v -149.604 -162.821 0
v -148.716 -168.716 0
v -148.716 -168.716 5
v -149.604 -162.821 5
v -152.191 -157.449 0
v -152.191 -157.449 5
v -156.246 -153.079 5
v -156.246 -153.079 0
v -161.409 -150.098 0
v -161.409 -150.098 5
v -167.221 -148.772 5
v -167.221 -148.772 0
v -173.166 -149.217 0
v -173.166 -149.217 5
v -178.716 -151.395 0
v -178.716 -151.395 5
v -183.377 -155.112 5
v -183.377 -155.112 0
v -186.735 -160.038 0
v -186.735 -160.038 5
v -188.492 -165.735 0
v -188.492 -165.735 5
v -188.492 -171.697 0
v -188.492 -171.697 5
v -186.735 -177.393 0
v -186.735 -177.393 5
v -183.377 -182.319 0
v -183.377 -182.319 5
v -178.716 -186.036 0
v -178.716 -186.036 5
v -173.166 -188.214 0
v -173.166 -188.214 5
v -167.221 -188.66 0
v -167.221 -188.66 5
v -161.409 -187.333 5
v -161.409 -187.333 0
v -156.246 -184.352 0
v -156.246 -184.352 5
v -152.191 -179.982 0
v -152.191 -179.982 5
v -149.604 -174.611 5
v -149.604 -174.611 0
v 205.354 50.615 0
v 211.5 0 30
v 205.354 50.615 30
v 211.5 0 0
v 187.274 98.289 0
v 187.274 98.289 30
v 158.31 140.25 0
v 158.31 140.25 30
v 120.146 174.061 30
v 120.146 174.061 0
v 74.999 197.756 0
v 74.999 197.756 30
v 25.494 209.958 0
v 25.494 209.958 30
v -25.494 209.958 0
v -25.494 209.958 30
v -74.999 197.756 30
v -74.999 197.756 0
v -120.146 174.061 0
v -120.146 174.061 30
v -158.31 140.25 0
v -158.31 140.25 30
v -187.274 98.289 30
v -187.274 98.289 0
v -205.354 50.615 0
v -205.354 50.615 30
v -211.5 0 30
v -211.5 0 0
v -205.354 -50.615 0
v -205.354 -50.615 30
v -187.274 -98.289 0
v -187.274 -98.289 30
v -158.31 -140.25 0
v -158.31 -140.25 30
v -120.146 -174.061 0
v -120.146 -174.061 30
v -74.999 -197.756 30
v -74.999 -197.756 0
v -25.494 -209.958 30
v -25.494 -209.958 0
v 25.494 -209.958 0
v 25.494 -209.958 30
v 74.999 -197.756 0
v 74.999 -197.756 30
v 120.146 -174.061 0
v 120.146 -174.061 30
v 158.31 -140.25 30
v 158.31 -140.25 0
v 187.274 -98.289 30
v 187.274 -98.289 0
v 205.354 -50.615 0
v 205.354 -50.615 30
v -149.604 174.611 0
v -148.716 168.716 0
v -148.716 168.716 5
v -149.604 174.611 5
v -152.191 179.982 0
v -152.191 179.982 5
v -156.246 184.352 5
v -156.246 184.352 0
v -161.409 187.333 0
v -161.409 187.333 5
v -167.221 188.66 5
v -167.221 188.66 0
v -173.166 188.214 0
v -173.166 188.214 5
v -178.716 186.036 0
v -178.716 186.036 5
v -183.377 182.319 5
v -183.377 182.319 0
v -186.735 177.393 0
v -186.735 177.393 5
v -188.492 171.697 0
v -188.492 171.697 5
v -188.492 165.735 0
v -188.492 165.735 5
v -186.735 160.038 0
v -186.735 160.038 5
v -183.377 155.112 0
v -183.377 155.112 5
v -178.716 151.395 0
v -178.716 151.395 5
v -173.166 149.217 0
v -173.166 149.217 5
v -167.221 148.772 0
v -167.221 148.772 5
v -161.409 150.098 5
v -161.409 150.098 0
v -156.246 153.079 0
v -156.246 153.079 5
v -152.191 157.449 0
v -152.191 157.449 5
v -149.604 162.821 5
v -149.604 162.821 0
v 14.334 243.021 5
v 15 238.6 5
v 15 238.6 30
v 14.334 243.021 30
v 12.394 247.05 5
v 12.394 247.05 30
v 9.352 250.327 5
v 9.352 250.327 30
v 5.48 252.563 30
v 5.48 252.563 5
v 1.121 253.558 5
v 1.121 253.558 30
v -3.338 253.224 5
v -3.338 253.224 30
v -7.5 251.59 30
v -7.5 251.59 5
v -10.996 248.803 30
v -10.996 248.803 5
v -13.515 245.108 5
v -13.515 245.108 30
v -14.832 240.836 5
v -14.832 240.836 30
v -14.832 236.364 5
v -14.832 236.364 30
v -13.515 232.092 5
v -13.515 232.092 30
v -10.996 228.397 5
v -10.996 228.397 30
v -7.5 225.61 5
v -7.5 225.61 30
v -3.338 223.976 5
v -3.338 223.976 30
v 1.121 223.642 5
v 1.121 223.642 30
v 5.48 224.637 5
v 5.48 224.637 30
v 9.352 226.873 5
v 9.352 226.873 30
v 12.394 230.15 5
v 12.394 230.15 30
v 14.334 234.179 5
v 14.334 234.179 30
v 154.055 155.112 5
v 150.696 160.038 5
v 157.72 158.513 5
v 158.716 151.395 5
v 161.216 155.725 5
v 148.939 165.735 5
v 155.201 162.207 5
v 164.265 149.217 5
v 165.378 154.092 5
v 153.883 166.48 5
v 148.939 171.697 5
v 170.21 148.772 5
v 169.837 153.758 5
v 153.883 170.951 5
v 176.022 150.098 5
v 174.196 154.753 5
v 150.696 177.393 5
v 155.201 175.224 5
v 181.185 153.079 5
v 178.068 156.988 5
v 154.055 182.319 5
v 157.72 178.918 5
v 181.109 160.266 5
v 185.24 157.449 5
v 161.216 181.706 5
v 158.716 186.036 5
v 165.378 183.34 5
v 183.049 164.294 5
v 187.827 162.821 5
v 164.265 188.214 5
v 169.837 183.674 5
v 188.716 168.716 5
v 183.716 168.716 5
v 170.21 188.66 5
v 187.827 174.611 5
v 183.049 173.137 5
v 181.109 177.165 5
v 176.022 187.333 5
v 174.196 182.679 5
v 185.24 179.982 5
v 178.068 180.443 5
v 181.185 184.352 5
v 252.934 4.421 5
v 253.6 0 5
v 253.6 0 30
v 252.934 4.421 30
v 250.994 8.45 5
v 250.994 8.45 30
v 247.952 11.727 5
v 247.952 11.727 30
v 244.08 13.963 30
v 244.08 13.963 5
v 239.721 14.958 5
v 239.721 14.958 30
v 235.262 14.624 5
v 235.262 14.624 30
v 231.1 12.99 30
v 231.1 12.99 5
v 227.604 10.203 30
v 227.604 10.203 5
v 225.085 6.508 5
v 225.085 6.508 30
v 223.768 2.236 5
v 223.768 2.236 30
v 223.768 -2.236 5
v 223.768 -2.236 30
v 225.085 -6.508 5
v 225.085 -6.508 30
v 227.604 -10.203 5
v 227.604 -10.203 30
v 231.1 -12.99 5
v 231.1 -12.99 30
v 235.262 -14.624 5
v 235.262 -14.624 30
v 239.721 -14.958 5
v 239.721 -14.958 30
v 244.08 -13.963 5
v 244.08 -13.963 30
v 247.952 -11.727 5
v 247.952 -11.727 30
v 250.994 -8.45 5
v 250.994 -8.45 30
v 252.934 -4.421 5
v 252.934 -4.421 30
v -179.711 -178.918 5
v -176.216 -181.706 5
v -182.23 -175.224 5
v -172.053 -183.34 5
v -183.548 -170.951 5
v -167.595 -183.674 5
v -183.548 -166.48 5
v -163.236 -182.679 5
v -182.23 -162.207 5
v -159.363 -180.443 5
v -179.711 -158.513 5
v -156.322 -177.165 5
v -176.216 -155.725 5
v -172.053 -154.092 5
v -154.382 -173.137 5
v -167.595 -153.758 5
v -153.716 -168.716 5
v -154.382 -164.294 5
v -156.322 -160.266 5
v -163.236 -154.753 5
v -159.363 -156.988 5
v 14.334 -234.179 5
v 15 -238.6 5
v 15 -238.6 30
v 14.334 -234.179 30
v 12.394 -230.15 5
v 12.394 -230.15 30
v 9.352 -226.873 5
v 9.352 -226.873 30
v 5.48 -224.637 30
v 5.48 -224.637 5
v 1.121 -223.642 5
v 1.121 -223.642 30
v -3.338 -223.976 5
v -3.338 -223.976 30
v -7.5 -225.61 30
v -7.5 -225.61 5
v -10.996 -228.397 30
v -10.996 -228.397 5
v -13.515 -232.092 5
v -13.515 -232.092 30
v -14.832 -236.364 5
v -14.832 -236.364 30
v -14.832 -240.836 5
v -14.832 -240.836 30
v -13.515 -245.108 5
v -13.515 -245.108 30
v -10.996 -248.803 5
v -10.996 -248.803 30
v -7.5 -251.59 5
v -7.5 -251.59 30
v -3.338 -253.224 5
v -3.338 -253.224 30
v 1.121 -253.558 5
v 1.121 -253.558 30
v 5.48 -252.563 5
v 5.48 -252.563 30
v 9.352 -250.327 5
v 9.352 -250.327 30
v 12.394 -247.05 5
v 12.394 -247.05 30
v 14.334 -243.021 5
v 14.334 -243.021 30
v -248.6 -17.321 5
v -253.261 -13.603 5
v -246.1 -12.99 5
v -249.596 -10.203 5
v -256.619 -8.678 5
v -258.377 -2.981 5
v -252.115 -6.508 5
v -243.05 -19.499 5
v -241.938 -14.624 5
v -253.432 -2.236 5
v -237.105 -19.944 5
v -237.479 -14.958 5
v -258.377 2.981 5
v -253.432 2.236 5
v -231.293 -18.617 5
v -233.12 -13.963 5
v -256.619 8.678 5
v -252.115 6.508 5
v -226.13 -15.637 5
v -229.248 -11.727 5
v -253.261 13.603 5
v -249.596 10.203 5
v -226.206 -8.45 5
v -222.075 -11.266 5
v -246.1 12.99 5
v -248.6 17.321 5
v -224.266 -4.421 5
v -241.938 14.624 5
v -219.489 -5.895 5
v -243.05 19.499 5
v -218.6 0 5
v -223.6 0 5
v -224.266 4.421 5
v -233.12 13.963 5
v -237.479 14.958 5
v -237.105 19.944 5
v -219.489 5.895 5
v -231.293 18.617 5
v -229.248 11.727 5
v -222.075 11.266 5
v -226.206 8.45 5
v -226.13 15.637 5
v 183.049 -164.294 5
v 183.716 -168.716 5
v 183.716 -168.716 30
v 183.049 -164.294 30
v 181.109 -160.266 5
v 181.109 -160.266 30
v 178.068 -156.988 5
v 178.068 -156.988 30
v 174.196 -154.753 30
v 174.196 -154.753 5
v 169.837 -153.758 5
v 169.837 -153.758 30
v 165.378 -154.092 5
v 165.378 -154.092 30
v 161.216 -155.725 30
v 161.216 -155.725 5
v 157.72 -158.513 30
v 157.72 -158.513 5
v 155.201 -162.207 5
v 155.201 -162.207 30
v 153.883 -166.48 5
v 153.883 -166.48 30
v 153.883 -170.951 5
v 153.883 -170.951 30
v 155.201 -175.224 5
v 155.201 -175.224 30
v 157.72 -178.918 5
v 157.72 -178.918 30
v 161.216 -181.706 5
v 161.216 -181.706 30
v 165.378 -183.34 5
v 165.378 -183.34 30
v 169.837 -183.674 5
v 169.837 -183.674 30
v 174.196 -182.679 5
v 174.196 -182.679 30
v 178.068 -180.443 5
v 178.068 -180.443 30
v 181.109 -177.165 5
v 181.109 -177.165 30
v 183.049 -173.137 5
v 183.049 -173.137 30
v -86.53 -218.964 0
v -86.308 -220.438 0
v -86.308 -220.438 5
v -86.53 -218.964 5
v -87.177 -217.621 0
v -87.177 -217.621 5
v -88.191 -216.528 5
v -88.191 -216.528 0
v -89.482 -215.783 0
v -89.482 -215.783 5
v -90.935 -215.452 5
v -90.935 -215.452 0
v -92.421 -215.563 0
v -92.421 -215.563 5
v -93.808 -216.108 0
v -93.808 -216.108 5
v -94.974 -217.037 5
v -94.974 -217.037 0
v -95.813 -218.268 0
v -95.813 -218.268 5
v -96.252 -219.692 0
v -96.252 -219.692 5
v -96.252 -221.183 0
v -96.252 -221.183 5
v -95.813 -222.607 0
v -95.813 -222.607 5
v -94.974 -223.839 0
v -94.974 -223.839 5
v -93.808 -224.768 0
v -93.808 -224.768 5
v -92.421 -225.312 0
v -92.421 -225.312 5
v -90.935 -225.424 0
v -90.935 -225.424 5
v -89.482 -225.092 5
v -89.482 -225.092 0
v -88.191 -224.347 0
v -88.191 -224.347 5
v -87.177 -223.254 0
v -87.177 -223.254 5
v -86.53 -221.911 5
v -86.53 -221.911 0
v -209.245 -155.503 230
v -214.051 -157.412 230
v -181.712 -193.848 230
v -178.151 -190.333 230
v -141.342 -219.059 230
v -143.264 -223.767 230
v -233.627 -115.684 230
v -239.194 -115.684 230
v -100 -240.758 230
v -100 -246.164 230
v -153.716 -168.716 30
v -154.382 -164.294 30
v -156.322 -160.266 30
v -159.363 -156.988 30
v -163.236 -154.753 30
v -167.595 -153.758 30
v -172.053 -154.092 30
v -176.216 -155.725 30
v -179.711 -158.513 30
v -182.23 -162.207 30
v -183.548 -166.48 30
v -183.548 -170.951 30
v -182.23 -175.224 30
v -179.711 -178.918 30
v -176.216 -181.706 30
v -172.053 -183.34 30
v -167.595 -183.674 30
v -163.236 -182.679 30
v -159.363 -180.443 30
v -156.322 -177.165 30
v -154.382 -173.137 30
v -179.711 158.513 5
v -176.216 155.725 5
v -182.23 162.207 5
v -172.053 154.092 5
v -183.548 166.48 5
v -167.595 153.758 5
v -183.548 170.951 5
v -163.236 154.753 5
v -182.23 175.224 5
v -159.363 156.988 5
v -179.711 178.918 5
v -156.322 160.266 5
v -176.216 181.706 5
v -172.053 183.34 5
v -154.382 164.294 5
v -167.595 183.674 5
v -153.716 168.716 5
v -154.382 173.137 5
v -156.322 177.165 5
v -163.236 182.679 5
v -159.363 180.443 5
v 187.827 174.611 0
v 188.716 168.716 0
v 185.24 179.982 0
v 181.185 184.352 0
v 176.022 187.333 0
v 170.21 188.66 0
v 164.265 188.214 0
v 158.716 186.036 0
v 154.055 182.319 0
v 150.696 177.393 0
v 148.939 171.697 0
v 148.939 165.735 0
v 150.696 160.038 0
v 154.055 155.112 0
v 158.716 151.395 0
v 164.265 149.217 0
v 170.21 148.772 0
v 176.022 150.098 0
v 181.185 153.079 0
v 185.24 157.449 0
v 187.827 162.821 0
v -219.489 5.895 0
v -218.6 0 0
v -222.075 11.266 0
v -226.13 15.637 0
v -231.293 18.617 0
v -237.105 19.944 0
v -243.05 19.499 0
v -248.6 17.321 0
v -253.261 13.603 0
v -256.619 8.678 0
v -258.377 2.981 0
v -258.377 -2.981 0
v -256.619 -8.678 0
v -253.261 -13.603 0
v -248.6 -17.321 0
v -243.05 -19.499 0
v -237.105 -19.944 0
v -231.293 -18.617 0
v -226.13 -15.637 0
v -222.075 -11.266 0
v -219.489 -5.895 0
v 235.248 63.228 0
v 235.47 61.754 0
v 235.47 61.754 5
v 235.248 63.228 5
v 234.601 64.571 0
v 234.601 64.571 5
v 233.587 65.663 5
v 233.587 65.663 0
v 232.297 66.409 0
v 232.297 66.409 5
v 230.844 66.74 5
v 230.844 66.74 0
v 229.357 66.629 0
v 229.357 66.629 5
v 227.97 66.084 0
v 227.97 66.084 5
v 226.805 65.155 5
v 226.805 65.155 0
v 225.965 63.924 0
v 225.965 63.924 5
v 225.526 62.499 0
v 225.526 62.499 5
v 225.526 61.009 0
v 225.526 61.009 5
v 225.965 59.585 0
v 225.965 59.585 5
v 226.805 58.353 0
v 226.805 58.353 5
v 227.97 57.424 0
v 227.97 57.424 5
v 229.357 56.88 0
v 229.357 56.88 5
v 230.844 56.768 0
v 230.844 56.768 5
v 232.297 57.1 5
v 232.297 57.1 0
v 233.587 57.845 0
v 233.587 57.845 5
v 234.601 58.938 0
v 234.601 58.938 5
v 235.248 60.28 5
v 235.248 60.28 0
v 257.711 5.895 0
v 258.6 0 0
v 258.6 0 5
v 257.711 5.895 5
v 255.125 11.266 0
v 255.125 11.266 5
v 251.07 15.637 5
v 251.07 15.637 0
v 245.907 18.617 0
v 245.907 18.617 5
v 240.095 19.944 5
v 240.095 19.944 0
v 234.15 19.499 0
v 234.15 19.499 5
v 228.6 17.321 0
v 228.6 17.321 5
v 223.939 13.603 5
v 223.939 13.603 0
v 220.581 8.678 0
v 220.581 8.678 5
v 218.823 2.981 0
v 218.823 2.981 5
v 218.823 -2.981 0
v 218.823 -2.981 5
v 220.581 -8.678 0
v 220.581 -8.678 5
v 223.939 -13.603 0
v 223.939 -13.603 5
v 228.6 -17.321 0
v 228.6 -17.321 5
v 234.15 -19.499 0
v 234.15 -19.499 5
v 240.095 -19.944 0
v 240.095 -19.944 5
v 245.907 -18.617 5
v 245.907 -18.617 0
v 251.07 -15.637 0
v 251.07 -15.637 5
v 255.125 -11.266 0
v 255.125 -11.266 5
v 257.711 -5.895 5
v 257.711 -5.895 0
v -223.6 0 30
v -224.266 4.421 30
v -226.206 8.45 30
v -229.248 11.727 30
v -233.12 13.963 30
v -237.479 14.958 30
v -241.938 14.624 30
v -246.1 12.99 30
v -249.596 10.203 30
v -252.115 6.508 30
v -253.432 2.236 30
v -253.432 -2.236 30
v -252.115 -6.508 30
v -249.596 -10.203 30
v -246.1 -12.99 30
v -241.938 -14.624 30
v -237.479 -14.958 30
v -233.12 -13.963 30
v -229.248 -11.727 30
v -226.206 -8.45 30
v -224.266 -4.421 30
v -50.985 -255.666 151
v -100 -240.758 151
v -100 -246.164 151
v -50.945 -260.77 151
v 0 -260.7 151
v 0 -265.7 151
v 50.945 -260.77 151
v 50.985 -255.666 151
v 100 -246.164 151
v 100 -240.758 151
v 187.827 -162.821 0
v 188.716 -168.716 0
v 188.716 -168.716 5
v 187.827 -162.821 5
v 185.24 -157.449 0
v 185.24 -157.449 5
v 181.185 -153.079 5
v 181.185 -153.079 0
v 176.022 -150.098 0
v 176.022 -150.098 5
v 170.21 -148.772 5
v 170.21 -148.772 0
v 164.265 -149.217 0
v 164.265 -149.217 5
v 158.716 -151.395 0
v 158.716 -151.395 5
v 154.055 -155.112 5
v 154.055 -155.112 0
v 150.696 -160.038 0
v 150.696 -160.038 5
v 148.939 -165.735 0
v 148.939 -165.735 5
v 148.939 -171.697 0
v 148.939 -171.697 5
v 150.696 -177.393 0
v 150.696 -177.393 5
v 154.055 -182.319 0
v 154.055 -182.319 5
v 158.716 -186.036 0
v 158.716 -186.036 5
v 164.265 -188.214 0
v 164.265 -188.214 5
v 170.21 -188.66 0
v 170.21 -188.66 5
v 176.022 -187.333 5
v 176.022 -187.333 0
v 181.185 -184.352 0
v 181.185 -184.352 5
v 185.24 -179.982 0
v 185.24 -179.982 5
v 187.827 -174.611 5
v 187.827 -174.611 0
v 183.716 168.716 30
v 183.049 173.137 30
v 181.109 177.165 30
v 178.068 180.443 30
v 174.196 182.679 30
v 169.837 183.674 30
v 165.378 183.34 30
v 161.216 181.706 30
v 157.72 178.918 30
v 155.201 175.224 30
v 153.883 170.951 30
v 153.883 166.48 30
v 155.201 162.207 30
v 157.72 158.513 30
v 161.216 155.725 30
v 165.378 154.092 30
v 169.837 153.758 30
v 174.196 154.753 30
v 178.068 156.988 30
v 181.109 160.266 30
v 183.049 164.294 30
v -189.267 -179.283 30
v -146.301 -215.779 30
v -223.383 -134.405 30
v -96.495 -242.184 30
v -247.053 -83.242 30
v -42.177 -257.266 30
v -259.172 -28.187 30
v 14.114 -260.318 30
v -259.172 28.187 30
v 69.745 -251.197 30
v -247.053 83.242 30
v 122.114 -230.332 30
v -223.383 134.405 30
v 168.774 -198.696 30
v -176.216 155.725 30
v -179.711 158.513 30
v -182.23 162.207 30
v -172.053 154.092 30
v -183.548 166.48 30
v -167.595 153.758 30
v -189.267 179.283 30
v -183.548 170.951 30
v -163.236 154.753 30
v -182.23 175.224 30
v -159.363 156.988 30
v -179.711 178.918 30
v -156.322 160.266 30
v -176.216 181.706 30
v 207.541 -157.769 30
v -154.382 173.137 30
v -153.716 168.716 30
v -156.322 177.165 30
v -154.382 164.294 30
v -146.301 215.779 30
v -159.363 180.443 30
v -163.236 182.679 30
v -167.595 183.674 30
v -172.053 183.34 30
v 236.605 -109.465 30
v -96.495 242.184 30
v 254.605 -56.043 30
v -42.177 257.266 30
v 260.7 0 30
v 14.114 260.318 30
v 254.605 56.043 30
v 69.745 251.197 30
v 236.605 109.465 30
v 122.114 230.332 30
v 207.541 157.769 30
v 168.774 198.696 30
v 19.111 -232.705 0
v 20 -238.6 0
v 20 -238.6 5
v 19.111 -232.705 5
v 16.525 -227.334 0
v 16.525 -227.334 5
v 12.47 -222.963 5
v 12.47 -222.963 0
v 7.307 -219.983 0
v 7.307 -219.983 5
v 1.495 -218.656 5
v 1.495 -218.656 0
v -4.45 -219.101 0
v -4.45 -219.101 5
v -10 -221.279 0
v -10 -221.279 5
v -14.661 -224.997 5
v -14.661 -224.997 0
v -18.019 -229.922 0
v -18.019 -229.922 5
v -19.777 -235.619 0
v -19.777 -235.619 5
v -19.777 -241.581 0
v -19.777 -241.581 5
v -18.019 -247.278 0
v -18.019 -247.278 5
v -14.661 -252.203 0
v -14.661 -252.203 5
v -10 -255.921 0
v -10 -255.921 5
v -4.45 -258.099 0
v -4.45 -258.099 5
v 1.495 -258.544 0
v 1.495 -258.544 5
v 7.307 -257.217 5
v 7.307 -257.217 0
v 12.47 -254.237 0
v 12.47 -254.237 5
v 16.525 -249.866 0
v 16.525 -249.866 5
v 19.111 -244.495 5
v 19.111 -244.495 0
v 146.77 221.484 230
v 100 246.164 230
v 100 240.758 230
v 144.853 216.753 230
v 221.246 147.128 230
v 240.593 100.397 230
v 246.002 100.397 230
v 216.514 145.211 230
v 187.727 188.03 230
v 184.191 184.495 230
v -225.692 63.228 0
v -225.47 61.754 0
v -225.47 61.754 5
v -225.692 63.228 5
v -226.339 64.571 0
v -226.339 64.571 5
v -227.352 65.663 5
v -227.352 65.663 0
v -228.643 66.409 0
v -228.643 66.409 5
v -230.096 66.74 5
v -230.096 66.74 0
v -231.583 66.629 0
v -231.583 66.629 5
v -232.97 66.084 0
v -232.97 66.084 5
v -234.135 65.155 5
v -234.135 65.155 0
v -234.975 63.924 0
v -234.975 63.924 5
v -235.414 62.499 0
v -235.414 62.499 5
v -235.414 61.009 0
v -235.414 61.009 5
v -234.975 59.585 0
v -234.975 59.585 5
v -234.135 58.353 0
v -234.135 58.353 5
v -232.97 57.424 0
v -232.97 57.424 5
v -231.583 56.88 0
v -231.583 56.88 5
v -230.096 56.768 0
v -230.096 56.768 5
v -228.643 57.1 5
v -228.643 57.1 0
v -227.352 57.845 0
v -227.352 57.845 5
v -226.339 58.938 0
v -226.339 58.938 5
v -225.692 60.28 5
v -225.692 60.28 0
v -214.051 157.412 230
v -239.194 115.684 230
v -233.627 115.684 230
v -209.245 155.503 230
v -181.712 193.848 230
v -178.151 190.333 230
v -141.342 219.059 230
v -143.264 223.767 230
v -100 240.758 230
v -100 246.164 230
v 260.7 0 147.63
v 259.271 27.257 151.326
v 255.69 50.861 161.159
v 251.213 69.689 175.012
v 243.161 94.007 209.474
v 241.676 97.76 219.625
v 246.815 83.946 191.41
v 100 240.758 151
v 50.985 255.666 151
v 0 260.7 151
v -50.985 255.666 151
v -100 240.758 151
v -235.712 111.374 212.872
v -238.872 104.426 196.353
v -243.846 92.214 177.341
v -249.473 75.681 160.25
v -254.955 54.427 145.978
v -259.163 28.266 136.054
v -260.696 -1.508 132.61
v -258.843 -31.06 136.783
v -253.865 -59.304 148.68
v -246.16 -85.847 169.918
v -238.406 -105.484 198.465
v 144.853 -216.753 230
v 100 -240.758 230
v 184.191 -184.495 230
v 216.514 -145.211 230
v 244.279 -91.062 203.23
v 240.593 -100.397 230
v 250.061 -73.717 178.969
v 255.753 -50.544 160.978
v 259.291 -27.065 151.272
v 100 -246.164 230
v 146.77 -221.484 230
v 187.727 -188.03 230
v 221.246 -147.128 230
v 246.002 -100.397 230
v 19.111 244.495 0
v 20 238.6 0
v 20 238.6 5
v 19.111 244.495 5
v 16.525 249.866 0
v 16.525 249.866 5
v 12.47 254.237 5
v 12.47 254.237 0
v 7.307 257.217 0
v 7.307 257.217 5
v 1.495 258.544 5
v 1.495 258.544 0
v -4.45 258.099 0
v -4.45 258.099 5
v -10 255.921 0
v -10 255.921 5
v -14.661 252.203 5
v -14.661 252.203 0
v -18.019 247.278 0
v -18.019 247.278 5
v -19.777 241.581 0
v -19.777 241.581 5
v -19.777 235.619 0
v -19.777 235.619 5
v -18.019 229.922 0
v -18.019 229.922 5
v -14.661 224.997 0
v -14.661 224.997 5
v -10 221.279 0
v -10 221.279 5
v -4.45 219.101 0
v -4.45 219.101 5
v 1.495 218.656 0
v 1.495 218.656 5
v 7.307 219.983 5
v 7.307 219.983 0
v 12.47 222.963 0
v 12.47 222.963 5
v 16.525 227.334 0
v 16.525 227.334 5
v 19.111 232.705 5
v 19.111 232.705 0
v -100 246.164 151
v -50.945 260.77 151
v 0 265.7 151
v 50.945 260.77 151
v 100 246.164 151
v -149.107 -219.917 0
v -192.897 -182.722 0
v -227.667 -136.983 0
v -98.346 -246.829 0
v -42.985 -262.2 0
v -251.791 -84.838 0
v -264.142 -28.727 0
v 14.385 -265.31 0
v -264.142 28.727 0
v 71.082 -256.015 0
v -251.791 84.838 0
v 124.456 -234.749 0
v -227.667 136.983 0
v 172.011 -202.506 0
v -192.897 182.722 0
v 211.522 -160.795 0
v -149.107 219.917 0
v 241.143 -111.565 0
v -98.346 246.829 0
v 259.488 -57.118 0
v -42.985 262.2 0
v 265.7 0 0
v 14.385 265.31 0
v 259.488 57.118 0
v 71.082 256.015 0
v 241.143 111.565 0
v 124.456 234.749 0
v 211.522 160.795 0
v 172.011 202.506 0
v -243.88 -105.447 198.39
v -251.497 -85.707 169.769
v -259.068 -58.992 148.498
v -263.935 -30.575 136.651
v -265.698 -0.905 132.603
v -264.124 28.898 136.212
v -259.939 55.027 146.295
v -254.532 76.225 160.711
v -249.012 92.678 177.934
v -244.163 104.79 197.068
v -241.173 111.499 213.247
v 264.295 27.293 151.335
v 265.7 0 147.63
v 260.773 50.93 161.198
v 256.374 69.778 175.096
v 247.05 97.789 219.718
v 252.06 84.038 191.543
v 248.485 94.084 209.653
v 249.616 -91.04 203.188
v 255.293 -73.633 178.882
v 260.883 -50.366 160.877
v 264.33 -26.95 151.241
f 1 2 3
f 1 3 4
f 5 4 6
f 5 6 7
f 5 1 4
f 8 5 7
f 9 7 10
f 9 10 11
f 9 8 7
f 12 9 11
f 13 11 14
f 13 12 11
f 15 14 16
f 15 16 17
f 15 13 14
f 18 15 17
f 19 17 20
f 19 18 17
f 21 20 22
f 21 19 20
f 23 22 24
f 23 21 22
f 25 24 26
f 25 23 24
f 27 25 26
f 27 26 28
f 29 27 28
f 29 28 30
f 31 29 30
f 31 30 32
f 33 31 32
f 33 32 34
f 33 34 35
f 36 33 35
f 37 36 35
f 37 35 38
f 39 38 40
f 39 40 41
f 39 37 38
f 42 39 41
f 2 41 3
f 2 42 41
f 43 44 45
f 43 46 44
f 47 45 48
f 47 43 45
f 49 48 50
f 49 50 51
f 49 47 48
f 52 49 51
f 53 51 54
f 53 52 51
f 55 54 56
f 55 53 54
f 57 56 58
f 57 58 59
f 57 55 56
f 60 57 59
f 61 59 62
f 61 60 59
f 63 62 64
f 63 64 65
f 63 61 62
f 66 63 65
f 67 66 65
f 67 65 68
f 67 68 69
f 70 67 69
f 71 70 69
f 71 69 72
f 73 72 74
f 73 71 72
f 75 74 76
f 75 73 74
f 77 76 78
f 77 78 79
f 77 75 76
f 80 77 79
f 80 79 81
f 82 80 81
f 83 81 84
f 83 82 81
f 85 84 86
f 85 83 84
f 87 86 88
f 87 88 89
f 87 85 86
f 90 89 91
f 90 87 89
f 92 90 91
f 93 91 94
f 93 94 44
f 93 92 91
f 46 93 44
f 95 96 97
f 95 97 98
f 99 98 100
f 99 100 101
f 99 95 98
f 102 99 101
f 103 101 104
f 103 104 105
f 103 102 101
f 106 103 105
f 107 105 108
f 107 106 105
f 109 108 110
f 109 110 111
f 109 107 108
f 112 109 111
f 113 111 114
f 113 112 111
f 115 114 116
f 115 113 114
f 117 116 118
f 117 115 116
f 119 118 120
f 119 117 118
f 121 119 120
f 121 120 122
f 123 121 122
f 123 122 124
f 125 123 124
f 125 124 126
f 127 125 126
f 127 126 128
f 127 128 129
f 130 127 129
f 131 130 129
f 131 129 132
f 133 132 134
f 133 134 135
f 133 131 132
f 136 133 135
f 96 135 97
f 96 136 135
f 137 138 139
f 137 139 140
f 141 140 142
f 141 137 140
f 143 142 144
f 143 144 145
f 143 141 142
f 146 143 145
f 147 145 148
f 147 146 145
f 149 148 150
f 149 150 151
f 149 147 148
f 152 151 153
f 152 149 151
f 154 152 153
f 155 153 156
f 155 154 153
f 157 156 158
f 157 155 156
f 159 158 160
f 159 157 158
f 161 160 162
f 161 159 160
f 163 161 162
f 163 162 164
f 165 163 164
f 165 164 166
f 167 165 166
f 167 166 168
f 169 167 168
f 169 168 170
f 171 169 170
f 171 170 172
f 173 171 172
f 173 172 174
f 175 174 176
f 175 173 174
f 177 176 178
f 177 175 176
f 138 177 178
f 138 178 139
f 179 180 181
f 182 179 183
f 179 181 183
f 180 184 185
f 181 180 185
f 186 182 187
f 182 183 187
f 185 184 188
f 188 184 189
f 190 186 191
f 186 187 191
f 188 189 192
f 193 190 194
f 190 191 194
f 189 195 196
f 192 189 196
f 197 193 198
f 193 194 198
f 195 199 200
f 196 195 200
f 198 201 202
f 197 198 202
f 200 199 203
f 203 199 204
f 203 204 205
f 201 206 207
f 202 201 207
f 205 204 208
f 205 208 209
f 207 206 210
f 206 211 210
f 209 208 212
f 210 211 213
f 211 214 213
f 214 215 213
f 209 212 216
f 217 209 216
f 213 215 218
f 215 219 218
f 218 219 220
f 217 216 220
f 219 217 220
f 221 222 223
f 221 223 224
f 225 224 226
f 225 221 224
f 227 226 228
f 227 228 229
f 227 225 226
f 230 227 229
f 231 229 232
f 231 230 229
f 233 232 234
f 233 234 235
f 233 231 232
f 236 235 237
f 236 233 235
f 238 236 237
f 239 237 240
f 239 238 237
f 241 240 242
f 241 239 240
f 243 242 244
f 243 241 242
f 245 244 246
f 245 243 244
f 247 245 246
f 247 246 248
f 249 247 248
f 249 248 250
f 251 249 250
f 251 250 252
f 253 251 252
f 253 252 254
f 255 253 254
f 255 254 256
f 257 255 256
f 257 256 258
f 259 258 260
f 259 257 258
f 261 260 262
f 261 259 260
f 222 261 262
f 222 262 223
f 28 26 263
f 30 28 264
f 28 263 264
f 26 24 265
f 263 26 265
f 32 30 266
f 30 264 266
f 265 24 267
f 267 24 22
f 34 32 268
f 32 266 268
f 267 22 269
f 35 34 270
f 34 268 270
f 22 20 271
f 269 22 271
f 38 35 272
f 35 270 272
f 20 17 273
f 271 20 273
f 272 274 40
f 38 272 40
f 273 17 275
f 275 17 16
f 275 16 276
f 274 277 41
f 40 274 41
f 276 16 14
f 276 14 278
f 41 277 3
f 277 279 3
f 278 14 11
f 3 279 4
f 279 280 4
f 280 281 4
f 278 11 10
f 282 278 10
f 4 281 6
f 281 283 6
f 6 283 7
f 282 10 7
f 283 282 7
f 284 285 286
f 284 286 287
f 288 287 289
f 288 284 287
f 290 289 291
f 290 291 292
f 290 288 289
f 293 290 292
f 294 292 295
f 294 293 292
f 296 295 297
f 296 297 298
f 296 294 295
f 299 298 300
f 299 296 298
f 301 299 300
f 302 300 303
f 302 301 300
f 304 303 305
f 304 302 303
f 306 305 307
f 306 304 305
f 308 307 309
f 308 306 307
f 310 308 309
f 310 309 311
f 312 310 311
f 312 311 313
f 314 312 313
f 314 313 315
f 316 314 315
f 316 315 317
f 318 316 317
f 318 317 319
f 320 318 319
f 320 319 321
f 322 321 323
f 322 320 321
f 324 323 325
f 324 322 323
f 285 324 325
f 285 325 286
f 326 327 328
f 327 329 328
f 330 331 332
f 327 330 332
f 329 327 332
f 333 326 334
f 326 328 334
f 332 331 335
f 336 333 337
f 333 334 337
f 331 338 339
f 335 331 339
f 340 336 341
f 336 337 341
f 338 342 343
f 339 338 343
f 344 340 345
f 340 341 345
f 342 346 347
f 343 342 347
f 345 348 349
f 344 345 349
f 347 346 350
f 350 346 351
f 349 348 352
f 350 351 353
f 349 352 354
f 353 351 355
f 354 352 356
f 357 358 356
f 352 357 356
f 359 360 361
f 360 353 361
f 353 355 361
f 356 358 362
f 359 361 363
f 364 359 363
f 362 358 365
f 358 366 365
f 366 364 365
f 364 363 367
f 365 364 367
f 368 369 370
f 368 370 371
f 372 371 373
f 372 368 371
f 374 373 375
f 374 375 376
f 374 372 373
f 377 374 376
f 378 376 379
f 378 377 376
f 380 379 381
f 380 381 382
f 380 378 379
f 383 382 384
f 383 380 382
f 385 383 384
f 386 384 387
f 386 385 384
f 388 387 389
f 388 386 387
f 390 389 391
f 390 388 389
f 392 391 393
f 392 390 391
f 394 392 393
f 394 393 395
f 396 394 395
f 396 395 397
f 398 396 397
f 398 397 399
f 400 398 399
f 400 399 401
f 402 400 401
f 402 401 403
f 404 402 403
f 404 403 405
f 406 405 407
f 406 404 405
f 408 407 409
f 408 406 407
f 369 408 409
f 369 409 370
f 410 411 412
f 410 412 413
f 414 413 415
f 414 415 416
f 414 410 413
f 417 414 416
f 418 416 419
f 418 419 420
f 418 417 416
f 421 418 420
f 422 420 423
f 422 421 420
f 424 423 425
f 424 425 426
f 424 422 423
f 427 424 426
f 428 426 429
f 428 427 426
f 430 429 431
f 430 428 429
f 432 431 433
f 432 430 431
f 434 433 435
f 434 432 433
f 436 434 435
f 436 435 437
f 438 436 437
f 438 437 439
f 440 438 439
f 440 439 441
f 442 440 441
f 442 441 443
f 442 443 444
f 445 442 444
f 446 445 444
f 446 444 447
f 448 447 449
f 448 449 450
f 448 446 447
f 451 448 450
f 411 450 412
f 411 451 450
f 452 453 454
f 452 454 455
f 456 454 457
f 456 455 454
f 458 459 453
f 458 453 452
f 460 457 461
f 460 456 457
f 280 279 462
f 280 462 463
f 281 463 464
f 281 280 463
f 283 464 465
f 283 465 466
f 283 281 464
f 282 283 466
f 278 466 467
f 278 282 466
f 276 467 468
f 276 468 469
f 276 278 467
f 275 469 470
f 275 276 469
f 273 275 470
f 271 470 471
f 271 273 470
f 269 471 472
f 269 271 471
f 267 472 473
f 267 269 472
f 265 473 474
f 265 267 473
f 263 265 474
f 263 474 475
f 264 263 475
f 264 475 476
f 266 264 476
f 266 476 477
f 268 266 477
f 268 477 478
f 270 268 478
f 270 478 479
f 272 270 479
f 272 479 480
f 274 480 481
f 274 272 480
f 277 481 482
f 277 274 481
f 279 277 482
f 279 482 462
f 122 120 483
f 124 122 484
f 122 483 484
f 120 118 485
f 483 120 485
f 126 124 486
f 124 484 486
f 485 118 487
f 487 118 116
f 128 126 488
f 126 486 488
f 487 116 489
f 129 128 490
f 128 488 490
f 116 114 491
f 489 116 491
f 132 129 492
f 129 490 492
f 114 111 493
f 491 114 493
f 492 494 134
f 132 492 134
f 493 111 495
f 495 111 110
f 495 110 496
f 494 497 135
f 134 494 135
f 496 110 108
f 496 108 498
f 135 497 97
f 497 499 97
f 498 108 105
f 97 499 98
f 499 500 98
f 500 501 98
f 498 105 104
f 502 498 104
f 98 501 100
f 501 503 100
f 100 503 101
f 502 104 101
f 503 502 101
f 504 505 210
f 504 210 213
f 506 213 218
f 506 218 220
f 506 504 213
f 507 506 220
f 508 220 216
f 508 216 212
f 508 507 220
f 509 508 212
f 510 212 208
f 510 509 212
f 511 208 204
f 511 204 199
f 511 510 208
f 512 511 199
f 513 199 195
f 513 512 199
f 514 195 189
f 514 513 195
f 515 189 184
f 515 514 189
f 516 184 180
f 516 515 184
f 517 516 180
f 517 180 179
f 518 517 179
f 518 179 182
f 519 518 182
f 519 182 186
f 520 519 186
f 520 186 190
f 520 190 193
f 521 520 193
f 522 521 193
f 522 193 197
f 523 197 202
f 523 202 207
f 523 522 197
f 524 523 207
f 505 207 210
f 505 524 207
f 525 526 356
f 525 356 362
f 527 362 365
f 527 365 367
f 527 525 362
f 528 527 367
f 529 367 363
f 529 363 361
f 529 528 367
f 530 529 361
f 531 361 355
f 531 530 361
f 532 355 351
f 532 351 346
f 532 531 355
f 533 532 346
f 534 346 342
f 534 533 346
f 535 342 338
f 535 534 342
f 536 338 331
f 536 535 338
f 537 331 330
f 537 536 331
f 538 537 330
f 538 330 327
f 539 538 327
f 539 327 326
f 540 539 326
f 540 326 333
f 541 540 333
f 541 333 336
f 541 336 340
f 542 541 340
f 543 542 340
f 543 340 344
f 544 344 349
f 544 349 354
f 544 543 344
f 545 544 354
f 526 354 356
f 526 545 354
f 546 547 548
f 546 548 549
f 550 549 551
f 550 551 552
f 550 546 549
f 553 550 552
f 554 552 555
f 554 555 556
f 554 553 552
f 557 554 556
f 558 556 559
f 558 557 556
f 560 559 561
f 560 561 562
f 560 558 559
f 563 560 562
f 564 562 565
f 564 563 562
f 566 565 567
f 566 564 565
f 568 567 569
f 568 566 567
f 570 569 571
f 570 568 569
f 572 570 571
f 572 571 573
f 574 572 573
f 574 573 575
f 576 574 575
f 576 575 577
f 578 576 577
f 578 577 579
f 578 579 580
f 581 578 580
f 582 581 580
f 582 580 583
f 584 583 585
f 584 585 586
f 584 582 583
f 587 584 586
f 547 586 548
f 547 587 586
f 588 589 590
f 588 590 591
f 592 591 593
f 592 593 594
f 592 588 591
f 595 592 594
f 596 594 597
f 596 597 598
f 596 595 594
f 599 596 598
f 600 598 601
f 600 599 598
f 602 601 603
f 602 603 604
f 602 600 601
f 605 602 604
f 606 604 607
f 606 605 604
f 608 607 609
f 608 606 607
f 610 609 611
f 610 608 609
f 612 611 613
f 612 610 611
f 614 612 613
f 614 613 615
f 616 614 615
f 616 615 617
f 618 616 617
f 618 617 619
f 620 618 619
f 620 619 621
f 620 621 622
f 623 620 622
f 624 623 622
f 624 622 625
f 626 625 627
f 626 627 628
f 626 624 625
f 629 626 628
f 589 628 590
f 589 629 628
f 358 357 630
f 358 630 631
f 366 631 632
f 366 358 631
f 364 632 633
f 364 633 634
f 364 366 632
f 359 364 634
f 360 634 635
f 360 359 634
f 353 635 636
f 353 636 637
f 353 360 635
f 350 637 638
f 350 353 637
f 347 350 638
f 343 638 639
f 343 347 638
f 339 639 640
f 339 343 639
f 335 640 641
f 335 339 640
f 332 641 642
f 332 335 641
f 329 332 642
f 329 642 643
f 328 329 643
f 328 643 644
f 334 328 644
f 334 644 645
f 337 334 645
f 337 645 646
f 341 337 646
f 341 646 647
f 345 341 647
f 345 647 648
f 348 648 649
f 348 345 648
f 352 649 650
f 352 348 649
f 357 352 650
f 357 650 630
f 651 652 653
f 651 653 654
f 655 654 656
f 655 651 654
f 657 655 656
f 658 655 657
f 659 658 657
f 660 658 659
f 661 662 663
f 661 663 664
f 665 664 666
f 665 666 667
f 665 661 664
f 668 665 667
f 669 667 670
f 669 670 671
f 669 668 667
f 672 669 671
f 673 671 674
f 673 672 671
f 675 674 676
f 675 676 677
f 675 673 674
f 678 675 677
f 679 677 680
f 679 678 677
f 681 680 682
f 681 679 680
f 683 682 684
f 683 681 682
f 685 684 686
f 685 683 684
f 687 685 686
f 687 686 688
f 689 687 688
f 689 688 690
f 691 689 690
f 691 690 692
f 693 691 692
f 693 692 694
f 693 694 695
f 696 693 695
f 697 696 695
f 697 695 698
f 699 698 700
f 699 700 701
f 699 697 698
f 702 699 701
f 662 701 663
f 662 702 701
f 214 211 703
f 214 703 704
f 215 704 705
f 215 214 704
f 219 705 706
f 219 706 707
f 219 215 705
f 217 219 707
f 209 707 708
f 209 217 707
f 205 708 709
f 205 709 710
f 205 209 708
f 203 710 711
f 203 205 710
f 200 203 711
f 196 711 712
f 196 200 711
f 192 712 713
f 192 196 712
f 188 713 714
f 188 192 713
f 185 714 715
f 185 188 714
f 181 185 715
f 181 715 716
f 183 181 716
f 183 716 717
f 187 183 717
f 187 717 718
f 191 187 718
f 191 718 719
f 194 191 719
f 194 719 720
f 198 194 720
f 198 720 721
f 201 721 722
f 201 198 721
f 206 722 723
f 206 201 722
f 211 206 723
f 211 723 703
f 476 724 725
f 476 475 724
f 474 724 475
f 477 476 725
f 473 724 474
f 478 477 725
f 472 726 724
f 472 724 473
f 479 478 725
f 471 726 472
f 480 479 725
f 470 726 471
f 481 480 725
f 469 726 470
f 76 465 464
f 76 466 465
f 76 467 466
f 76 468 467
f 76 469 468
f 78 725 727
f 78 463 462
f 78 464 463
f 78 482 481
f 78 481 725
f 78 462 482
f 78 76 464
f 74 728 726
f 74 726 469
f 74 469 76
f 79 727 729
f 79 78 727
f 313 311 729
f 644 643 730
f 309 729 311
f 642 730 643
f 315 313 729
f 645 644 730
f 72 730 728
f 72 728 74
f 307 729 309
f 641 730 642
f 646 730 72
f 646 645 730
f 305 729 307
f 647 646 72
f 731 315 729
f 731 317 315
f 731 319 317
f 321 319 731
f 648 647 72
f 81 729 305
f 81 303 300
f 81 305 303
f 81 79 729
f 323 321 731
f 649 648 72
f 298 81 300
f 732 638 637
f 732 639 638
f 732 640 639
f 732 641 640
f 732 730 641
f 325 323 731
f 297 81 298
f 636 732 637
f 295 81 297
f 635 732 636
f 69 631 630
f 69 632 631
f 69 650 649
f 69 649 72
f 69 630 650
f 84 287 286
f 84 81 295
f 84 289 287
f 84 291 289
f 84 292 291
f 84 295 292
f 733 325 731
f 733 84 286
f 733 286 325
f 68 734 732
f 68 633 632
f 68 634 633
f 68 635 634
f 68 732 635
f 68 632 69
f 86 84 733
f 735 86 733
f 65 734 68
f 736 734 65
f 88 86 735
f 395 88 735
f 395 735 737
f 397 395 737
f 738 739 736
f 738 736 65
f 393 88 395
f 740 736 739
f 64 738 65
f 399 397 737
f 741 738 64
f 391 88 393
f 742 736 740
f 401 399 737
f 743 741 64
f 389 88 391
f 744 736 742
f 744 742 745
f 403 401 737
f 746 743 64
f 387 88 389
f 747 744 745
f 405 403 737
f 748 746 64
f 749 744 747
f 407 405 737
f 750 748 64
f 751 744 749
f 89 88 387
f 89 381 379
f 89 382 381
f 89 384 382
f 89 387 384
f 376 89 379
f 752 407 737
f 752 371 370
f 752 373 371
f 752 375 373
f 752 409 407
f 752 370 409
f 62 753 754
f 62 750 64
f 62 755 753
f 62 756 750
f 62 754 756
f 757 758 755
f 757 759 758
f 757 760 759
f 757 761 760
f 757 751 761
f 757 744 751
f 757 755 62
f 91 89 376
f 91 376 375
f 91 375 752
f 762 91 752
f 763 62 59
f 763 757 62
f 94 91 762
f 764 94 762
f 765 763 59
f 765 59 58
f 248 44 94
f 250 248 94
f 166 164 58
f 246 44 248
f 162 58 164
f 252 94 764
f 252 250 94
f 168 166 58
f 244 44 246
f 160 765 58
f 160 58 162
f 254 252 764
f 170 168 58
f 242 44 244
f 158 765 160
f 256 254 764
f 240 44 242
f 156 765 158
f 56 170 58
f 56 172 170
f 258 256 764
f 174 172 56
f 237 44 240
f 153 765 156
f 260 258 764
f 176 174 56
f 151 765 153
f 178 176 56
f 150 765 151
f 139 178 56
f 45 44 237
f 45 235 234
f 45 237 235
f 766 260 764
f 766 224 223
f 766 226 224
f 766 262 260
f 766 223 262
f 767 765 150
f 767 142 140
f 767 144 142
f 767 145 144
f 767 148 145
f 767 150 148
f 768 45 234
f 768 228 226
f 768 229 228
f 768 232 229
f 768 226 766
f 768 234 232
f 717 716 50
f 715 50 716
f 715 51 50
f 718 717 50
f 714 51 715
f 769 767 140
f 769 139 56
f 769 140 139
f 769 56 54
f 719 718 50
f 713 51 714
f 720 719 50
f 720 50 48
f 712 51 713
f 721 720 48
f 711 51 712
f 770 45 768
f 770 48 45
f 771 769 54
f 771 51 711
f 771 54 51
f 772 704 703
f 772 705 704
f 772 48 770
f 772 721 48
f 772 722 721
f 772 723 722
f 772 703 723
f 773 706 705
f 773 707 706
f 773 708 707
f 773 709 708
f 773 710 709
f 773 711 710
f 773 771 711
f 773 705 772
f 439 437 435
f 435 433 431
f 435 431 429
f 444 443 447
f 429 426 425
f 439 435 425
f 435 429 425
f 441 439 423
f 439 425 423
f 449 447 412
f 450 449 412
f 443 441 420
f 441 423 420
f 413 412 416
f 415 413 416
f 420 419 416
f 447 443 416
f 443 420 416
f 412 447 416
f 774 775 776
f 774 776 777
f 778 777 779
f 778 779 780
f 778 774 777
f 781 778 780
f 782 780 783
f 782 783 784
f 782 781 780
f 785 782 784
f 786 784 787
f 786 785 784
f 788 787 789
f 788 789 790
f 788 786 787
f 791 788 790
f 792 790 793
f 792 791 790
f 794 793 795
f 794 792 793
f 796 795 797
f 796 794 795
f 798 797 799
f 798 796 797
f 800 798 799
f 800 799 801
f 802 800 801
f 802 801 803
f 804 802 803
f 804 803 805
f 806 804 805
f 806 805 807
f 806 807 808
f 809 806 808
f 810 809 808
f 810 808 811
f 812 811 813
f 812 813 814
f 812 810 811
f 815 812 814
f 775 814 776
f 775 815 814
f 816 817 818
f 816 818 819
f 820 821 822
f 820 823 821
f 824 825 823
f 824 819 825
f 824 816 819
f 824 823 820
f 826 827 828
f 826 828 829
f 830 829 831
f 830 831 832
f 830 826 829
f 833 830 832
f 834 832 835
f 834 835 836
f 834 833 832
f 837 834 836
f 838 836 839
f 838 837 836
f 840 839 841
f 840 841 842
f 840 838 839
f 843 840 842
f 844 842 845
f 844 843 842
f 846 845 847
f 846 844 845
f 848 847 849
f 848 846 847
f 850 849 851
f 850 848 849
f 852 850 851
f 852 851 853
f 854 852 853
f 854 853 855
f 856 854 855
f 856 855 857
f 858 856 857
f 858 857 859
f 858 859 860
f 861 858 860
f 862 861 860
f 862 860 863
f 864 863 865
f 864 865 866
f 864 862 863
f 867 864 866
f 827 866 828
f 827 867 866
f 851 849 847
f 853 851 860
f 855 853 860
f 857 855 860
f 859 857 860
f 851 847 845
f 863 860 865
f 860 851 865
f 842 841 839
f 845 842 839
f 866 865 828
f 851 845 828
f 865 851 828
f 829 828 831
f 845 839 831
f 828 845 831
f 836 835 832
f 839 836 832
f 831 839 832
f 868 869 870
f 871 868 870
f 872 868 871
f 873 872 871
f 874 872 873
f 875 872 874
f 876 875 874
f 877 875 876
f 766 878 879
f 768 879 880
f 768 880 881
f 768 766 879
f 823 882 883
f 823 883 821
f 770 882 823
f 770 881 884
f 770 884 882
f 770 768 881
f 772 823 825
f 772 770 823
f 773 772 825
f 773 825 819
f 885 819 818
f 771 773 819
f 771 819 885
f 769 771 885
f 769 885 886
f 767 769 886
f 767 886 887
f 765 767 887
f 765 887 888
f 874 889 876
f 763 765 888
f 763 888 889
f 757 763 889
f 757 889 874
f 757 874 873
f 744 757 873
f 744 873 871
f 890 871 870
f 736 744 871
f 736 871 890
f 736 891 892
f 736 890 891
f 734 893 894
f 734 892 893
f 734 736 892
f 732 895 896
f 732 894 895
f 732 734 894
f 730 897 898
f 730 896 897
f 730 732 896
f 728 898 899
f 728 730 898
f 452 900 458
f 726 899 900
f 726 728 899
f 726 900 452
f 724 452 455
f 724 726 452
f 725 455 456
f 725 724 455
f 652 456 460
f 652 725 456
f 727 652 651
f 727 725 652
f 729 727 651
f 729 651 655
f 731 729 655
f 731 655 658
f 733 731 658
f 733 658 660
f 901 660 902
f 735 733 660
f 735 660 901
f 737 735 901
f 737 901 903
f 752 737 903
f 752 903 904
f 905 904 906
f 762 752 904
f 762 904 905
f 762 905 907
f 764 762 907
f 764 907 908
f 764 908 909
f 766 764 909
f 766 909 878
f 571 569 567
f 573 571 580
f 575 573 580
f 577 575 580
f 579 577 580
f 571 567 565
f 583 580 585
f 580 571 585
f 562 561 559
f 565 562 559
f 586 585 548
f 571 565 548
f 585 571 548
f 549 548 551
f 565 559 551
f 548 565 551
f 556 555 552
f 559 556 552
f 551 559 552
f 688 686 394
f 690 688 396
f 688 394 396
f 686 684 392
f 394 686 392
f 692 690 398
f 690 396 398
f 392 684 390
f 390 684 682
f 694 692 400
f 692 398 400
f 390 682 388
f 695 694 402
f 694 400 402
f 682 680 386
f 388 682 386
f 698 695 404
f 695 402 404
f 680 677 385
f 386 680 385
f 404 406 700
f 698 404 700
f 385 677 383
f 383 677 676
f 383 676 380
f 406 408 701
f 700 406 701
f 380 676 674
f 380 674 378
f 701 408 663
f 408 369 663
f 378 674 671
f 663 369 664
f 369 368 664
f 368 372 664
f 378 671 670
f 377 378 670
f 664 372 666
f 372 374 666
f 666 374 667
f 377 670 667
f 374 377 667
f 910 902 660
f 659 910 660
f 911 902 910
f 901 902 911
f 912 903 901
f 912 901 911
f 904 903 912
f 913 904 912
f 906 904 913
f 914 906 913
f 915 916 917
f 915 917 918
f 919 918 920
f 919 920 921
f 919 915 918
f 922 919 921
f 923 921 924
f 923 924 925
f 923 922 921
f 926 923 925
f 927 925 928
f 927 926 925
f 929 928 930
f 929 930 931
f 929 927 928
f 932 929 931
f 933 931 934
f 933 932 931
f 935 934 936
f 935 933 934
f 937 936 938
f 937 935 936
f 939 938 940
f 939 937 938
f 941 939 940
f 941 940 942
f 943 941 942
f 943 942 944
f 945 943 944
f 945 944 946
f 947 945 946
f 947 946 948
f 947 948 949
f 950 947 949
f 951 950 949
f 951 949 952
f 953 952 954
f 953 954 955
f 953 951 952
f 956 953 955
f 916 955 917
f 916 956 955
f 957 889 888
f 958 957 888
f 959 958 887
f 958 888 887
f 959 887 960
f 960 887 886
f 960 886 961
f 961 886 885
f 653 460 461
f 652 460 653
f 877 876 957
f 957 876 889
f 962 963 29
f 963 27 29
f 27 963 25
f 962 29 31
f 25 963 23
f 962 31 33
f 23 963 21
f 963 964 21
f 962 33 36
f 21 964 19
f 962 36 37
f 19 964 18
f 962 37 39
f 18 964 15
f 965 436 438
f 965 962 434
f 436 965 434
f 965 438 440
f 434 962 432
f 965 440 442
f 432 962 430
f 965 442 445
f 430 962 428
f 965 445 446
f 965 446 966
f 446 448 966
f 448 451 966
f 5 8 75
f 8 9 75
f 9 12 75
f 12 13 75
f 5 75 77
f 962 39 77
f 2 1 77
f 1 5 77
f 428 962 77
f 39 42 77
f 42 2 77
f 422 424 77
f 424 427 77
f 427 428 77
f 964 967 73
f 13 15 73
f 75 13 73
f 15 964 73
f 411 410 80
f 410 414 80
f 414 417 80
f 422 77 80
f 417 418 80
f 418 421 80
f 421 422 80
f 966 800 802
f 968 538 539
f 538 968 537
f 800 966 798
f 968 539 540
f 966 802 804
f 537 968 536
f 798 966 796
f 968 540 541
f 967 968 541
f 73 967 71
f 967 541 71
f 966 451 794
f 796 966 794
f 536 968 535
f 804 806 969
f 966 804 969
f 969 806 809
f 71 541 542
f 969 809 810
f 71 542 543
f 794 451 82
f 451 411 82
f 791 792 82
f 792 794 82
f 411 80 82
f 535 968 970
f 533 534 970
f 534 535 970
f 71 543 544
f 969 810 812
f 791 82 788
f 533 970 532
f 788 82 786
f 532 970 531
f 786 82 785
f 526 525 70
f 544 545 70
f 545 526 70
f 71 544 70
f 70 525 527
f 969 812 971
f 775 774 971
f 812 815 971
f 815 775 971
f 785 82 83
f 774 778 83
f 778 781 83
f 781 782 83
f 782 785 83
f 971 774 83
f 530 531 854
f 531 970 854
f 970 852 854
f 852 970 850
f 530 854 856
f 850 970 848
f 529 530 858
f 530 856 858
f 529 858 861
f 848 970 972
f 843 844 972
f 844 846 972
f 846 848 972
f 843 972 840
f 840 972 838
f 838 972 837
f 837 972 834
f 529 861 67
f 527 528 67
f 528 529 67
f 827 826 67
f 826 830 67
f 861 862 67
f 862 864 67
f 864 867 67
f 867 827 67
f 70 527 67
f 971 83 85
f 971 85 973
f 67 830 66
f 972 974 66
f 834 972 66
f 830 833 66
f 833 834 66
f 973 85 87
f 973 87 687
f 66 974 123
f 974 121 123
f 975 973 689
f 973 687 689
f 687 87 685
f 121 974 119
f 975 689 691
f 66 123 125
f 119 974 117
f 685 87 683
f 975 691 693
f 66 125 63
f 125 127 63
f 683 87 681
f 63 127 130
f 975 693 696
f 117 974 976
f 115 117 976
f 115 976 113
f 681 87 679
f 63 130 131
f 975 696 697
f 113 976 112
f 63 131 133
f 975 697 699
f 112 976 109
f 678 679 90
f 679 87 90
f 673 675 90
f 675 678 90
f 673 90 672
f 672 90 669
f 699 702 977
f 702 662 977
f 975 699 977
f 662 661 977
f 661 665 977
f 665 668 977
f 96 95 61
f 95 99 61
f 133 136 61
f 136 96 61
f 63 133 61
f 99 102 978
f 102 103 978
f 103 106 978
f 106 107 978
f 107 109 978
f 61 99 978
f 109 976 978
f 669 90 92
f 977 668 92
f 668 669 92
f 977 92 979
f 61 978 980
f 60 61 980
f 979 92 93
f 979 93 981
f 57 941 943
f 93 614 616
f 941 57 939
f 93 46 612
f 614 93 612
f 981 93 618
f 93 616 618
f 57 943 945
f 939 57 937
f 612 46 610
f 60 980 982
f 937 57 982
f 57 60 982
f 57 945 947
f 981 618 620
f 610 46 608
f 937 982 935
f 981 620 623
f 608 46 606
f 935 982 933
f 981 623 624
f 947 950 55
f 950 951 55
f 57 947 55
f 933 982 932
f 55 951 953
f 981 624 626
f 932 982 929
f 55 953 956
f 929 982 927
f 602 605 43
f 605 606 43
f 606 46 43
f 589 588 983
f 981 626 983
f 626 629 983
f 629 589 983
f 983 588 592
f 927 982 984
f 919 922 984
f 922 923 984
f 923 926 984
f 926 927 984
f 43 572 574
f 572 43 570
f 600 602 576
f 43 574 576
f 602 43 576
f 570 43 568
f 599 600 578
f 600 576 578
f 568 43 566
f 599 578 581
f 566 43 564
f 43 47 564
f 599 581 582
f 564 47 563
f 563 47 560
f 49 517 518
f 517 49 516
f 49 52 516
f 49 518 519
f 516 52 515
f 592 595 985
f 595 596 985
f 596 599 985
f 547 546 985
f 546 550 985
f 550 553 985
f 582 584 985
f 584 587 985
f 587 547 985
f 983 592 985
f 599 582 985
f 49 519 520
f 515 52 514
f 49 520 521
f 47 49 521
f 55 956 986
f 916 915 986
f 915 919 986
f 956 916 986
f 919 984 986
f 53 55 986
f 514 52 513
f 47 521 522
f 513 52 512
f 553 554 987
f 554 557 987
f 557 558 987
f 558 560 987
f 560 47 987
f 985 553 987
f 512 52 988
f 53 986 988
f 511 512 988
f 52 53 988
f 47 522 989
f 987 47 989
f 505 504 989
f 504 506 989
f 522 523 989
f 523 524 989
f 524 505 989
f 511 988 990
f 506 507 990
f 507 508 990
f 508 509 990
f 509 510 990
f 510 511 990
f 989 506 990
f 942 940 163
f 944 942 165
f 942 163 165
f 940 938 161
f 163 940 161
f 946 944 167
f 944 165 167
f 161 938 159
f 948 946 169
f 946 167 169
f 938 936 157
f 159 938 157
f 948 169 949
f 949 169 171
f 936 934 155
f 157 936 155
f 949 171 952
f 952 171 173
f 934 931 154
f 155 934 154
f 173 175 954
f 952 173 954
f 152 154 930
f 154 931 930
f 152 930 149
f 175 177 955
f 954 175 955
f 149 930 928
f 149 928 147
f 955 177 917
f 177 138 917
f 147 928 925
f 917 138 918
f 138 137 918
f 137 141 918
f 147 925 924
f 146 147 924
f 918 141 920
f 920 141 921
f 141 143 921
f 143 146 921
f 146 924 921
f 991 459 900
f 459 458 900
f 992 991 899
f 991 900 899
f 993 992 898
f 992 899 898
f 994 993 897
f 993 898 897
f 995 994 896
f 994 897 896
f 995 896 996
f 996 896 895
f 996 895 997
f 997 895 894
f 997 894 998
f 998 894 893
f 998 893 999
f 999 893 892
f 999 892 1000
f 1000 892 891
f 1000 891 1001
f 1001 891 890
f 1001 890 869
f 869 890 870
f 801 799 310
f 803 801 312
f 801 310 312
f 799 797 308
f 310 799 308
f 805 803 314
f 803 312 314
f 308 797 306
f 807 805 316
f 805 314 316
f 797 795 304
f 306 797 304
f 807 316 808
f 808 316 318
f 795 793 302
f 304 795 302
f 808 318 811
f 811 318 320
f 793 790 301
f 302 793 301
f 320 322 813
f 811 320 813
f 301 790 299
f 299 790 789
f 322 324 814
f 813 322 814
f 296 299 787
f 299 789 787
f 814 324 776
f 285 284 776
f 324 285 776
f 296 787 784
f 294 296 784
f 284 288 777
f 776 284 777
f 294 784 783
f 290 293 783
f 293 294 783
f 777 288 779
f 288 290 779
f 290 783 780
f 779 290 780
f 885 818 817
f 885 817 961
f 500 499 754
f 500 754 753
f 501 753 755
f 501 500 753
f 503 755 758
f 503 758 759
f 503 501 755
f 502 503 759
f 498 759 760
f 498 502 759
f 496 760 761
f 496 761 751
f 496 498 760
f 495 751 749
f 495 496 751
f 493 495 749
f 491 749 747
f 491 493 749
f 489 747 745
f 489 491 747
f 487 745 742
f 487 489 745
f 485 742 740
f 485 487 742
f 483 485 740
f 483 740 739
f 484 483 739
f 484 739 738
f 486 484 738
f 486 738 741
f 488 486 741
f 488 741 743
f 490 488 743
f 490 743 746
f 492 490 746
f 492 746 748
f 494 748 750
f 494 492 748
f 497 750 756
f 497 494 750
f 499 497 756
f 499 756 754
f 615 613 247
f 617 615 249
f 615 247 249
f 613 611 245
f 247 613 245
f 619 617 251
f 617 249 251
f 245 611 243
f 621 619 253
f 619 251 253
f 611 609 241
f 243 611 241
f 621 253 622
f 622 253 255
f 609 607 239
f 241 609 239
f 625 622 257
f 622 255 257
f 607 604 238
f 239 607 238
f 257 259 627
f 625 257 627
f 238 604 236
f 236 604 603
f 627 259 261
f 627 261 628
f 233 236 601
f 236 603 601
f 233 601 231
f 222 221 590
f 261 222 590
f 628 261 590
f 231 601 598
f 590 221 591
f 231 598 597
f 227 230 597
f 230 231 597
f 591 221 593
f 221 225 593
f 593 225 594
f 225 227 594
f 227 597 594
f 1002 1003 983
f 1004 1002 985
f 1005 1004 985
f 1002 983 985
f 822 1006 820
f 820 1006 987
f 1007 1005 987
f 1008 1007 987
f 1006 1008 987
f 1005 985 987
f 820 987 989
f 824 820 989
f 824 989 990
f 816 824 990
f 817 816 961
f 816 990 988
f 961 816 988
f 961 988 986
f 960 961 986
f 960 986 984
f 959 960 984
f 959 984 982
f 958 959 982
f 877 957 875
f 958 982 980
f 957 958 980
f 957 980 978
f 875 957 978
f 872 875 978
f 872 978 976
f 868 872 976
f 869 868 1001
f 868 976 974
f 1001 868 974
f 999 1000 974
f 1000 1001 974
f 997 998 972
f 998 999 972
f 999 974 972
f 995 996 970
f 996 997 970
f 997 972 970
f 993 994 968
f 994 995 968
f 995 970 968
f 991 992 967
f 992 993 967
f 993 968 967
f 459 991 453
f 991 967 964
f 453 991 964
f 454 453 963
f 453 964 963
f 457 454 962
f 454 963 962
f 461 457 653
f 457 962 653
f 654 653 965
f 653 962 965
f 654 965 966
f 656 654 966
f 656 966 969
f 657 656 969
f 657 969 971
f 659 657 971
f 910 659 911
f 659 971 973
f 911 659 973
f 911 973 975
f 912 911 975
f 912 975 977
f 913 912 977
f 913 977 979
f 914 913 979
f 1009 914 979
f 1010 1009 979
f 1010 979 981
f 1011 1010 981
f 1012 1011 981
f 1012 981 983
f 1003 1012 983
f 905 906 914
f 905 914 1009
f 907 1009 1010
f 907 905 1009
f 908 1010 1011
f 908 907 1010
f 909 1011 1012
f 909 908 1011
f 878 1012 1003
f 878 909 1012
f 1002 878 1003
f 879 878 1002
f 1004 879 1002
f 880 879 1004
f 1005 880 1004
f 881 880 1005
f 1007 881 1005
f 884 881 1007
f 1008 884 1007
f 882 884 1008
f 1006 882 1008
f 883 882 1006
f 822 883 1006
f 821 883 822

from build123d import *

# Parameters (mm, degrees)
SKETCH1_R           = 265.7
SKETCH1_R_2         = 211.5
SKETCH1_R_3         = 20
SKETCH1_R_4         = 5
EXTRUDE1_DEPTH      = 5
SKETCH2_R           = 265.7
SKETCH2_R_2         = 15
SKETCH2_R_3         = 211.5
EXTRUDE2_DEPTH      = 25
SKETCH3_R           = 265.7
SKETCH3_R_2         = 260.7
EXTRUDE3_DEPTH      = 200
SKETCH4_R           = 102.37
EXTRUDE4_DEPTH      = 266.7
SKETCH5_R           = 117.4
EXTRUDE5_DEPTH      = 266.7000001
SKETCH6_W           = 200
SKETCH6_H           = 79
EXTRUDE6_DEPTH      = 266.7000001
EXTRUDE6_DEPTH_BACK = 266.7000001


with BuildPart() as part:
    # Sketch1 → Extrude1 (new body)
    with BuildSketch(Plane.XY):
        Circle(SKETCH1_R)
        Circle(SKETCH1_R_2, mode=Mode.SUBTRACT)
        with Locations((238.6, 0)):
            Circle(SKETCH1_R_3, mode=Mode.SUBTRACT)
        with Locations((168.715677991, 168.715677991)):
            Circle(SKETCH1_R_3, mode=Mode.SUBTRACT)
        with Locations((0, 238.6)):
            Circle(SKETCH1_R_3, mode=Mode.SUBTRACT)
        with Locations((-168.715677991, 168.715677991)):
            Circle(SKETCH1_R_3, mode=Mode.SUBTRACT)
        with Locations((-238.6, 0)):
            Circle(SKETCH1_R_3, mode=Mode.SUBTRACT)
        with Locations((-168.715677991, -168.715677991)):
            Circle(SKETCH1_R_3, mode=Mode.SUBTRACT)
        with Locations((0, -238.6)):
            Circle(SKETCH1_R_3, mode=Mode.SUBTRACT)
        with Locations((168.715677991, -168.715677991)):
            Circle(SKETCH1_R_3, mode=Mode.SUBTRACT)
        with Locations((230.469902153, 61.754224161)):
            Circle(SKETCH1_R_4, mode=Mode.SUBTRACT)
        with Locations((-230.469902153, 61.754224161)):
            Circle(SKETCH1_R_4, mode=Mode.SUBTRACT)
        with Locations((-91.308266962, -220.437656457)):
            Circle(SKETCH1_R_4, mode=Mode.SUBTRACT)
    extrude(amount=EXTRUDE1_DEPTH)

    # Sketch2 → Extrude2 (add)
    with BuildSketch(Plane.XY.offset(5)):
        Circle(SKETCH2_R)
        with Locations((238.6, 0)):
            Circle(SKETCH2_R_2, mode=Mode.SUBTRACT)
        with Locations((168.715677991, 168.715677991)):
            Circle(SKETCH2_R_2, mode=Mode.SUBTRACT)
        with Locations((0, 238.6)):
            Circle(SKETCH2_R_2, mode=Mode.SUBTRACT)
        with Locations((-168.715677991, 168.715677991)):
            Circle(SKETCH2_R_2, mode=Mode.SUBTRACT)
        with Locations((-238.6, 0)):
            Circle(SKETCH2_R_2, mode=Mode.SUBTRACT)
        with Locations((-168.715677991, -168.715677991)):
            Circle(SKETCH2_R_2, mode=Mode.SUBTRACT)
        with Locations((0, -238.6)):
            Circle(SKETCH2_R_2, mode=Mode.SUBTRACT)
        with Locations((168.715677991, -168.715677991)):
            Circle(SKETCH2_R_2, mode=Mode.SUBTRACT)
        Circle(SKETCH2_R_3, mode=Mode.SUBTRACT)
    extrude(amount=EXTRUDE2_DEPTH)

    # Sketch3 → Extrude3 (add)
    with BuildSketch(Plane.XY.offset(30)):
        Circle(SKETCH3_R)
        Circle(SKETCH3_R_2, mode=Mode.SUBTRACT)
    extrude(amount=EXTRUDE3_DEPTH)

    # Sketch4 → Extrude4 (cut, through all)
    with BuildSketch(Plane(origin=(0, 0, 0), x_dir=(0, 0, -1), z_dir=(1, 0, 0))):
        with Locations((-250, 0)):
            Circle(SKETCH4_R)
    extrude(amount=EXTRUDE4_DEPTH, mode=Mode.SUBTRACT)

    # Sketch5 → Extrude5 (cut, through all)
    with BuildSketch(Plane(origin=(0, 0, 0), x_dir=(0, 0, -1), z_dir=(1, 0, 0))):
        with Locations((-250, 0)):
            Circle(SKETCH5_R)
    extrude(amount=-EXTRUDE5_DEPTH, mode=Mode.SUBTRACT)

    # Sketch6 → Extrude6 (cut, two sides)
    with BuildSketch(Plane(origin=(0, 0, 0), x_dir=(1, 0, 0), z_dir=(0, 1, 0))) as extrude6_sk:
        with Locations((0, -190.5)):
            Rectangle(SKETCH6_W, SKETCH6_H)
    extrude(amount=EXTRUDE6_DEPTH, mode=Mode.SUBTRACT)
    extrude(extrude6_sk.sketch, amount=-EXTRUDE6_DEPTH_BACK, mode=Mode.SUBTRACT)


solid = part.part
